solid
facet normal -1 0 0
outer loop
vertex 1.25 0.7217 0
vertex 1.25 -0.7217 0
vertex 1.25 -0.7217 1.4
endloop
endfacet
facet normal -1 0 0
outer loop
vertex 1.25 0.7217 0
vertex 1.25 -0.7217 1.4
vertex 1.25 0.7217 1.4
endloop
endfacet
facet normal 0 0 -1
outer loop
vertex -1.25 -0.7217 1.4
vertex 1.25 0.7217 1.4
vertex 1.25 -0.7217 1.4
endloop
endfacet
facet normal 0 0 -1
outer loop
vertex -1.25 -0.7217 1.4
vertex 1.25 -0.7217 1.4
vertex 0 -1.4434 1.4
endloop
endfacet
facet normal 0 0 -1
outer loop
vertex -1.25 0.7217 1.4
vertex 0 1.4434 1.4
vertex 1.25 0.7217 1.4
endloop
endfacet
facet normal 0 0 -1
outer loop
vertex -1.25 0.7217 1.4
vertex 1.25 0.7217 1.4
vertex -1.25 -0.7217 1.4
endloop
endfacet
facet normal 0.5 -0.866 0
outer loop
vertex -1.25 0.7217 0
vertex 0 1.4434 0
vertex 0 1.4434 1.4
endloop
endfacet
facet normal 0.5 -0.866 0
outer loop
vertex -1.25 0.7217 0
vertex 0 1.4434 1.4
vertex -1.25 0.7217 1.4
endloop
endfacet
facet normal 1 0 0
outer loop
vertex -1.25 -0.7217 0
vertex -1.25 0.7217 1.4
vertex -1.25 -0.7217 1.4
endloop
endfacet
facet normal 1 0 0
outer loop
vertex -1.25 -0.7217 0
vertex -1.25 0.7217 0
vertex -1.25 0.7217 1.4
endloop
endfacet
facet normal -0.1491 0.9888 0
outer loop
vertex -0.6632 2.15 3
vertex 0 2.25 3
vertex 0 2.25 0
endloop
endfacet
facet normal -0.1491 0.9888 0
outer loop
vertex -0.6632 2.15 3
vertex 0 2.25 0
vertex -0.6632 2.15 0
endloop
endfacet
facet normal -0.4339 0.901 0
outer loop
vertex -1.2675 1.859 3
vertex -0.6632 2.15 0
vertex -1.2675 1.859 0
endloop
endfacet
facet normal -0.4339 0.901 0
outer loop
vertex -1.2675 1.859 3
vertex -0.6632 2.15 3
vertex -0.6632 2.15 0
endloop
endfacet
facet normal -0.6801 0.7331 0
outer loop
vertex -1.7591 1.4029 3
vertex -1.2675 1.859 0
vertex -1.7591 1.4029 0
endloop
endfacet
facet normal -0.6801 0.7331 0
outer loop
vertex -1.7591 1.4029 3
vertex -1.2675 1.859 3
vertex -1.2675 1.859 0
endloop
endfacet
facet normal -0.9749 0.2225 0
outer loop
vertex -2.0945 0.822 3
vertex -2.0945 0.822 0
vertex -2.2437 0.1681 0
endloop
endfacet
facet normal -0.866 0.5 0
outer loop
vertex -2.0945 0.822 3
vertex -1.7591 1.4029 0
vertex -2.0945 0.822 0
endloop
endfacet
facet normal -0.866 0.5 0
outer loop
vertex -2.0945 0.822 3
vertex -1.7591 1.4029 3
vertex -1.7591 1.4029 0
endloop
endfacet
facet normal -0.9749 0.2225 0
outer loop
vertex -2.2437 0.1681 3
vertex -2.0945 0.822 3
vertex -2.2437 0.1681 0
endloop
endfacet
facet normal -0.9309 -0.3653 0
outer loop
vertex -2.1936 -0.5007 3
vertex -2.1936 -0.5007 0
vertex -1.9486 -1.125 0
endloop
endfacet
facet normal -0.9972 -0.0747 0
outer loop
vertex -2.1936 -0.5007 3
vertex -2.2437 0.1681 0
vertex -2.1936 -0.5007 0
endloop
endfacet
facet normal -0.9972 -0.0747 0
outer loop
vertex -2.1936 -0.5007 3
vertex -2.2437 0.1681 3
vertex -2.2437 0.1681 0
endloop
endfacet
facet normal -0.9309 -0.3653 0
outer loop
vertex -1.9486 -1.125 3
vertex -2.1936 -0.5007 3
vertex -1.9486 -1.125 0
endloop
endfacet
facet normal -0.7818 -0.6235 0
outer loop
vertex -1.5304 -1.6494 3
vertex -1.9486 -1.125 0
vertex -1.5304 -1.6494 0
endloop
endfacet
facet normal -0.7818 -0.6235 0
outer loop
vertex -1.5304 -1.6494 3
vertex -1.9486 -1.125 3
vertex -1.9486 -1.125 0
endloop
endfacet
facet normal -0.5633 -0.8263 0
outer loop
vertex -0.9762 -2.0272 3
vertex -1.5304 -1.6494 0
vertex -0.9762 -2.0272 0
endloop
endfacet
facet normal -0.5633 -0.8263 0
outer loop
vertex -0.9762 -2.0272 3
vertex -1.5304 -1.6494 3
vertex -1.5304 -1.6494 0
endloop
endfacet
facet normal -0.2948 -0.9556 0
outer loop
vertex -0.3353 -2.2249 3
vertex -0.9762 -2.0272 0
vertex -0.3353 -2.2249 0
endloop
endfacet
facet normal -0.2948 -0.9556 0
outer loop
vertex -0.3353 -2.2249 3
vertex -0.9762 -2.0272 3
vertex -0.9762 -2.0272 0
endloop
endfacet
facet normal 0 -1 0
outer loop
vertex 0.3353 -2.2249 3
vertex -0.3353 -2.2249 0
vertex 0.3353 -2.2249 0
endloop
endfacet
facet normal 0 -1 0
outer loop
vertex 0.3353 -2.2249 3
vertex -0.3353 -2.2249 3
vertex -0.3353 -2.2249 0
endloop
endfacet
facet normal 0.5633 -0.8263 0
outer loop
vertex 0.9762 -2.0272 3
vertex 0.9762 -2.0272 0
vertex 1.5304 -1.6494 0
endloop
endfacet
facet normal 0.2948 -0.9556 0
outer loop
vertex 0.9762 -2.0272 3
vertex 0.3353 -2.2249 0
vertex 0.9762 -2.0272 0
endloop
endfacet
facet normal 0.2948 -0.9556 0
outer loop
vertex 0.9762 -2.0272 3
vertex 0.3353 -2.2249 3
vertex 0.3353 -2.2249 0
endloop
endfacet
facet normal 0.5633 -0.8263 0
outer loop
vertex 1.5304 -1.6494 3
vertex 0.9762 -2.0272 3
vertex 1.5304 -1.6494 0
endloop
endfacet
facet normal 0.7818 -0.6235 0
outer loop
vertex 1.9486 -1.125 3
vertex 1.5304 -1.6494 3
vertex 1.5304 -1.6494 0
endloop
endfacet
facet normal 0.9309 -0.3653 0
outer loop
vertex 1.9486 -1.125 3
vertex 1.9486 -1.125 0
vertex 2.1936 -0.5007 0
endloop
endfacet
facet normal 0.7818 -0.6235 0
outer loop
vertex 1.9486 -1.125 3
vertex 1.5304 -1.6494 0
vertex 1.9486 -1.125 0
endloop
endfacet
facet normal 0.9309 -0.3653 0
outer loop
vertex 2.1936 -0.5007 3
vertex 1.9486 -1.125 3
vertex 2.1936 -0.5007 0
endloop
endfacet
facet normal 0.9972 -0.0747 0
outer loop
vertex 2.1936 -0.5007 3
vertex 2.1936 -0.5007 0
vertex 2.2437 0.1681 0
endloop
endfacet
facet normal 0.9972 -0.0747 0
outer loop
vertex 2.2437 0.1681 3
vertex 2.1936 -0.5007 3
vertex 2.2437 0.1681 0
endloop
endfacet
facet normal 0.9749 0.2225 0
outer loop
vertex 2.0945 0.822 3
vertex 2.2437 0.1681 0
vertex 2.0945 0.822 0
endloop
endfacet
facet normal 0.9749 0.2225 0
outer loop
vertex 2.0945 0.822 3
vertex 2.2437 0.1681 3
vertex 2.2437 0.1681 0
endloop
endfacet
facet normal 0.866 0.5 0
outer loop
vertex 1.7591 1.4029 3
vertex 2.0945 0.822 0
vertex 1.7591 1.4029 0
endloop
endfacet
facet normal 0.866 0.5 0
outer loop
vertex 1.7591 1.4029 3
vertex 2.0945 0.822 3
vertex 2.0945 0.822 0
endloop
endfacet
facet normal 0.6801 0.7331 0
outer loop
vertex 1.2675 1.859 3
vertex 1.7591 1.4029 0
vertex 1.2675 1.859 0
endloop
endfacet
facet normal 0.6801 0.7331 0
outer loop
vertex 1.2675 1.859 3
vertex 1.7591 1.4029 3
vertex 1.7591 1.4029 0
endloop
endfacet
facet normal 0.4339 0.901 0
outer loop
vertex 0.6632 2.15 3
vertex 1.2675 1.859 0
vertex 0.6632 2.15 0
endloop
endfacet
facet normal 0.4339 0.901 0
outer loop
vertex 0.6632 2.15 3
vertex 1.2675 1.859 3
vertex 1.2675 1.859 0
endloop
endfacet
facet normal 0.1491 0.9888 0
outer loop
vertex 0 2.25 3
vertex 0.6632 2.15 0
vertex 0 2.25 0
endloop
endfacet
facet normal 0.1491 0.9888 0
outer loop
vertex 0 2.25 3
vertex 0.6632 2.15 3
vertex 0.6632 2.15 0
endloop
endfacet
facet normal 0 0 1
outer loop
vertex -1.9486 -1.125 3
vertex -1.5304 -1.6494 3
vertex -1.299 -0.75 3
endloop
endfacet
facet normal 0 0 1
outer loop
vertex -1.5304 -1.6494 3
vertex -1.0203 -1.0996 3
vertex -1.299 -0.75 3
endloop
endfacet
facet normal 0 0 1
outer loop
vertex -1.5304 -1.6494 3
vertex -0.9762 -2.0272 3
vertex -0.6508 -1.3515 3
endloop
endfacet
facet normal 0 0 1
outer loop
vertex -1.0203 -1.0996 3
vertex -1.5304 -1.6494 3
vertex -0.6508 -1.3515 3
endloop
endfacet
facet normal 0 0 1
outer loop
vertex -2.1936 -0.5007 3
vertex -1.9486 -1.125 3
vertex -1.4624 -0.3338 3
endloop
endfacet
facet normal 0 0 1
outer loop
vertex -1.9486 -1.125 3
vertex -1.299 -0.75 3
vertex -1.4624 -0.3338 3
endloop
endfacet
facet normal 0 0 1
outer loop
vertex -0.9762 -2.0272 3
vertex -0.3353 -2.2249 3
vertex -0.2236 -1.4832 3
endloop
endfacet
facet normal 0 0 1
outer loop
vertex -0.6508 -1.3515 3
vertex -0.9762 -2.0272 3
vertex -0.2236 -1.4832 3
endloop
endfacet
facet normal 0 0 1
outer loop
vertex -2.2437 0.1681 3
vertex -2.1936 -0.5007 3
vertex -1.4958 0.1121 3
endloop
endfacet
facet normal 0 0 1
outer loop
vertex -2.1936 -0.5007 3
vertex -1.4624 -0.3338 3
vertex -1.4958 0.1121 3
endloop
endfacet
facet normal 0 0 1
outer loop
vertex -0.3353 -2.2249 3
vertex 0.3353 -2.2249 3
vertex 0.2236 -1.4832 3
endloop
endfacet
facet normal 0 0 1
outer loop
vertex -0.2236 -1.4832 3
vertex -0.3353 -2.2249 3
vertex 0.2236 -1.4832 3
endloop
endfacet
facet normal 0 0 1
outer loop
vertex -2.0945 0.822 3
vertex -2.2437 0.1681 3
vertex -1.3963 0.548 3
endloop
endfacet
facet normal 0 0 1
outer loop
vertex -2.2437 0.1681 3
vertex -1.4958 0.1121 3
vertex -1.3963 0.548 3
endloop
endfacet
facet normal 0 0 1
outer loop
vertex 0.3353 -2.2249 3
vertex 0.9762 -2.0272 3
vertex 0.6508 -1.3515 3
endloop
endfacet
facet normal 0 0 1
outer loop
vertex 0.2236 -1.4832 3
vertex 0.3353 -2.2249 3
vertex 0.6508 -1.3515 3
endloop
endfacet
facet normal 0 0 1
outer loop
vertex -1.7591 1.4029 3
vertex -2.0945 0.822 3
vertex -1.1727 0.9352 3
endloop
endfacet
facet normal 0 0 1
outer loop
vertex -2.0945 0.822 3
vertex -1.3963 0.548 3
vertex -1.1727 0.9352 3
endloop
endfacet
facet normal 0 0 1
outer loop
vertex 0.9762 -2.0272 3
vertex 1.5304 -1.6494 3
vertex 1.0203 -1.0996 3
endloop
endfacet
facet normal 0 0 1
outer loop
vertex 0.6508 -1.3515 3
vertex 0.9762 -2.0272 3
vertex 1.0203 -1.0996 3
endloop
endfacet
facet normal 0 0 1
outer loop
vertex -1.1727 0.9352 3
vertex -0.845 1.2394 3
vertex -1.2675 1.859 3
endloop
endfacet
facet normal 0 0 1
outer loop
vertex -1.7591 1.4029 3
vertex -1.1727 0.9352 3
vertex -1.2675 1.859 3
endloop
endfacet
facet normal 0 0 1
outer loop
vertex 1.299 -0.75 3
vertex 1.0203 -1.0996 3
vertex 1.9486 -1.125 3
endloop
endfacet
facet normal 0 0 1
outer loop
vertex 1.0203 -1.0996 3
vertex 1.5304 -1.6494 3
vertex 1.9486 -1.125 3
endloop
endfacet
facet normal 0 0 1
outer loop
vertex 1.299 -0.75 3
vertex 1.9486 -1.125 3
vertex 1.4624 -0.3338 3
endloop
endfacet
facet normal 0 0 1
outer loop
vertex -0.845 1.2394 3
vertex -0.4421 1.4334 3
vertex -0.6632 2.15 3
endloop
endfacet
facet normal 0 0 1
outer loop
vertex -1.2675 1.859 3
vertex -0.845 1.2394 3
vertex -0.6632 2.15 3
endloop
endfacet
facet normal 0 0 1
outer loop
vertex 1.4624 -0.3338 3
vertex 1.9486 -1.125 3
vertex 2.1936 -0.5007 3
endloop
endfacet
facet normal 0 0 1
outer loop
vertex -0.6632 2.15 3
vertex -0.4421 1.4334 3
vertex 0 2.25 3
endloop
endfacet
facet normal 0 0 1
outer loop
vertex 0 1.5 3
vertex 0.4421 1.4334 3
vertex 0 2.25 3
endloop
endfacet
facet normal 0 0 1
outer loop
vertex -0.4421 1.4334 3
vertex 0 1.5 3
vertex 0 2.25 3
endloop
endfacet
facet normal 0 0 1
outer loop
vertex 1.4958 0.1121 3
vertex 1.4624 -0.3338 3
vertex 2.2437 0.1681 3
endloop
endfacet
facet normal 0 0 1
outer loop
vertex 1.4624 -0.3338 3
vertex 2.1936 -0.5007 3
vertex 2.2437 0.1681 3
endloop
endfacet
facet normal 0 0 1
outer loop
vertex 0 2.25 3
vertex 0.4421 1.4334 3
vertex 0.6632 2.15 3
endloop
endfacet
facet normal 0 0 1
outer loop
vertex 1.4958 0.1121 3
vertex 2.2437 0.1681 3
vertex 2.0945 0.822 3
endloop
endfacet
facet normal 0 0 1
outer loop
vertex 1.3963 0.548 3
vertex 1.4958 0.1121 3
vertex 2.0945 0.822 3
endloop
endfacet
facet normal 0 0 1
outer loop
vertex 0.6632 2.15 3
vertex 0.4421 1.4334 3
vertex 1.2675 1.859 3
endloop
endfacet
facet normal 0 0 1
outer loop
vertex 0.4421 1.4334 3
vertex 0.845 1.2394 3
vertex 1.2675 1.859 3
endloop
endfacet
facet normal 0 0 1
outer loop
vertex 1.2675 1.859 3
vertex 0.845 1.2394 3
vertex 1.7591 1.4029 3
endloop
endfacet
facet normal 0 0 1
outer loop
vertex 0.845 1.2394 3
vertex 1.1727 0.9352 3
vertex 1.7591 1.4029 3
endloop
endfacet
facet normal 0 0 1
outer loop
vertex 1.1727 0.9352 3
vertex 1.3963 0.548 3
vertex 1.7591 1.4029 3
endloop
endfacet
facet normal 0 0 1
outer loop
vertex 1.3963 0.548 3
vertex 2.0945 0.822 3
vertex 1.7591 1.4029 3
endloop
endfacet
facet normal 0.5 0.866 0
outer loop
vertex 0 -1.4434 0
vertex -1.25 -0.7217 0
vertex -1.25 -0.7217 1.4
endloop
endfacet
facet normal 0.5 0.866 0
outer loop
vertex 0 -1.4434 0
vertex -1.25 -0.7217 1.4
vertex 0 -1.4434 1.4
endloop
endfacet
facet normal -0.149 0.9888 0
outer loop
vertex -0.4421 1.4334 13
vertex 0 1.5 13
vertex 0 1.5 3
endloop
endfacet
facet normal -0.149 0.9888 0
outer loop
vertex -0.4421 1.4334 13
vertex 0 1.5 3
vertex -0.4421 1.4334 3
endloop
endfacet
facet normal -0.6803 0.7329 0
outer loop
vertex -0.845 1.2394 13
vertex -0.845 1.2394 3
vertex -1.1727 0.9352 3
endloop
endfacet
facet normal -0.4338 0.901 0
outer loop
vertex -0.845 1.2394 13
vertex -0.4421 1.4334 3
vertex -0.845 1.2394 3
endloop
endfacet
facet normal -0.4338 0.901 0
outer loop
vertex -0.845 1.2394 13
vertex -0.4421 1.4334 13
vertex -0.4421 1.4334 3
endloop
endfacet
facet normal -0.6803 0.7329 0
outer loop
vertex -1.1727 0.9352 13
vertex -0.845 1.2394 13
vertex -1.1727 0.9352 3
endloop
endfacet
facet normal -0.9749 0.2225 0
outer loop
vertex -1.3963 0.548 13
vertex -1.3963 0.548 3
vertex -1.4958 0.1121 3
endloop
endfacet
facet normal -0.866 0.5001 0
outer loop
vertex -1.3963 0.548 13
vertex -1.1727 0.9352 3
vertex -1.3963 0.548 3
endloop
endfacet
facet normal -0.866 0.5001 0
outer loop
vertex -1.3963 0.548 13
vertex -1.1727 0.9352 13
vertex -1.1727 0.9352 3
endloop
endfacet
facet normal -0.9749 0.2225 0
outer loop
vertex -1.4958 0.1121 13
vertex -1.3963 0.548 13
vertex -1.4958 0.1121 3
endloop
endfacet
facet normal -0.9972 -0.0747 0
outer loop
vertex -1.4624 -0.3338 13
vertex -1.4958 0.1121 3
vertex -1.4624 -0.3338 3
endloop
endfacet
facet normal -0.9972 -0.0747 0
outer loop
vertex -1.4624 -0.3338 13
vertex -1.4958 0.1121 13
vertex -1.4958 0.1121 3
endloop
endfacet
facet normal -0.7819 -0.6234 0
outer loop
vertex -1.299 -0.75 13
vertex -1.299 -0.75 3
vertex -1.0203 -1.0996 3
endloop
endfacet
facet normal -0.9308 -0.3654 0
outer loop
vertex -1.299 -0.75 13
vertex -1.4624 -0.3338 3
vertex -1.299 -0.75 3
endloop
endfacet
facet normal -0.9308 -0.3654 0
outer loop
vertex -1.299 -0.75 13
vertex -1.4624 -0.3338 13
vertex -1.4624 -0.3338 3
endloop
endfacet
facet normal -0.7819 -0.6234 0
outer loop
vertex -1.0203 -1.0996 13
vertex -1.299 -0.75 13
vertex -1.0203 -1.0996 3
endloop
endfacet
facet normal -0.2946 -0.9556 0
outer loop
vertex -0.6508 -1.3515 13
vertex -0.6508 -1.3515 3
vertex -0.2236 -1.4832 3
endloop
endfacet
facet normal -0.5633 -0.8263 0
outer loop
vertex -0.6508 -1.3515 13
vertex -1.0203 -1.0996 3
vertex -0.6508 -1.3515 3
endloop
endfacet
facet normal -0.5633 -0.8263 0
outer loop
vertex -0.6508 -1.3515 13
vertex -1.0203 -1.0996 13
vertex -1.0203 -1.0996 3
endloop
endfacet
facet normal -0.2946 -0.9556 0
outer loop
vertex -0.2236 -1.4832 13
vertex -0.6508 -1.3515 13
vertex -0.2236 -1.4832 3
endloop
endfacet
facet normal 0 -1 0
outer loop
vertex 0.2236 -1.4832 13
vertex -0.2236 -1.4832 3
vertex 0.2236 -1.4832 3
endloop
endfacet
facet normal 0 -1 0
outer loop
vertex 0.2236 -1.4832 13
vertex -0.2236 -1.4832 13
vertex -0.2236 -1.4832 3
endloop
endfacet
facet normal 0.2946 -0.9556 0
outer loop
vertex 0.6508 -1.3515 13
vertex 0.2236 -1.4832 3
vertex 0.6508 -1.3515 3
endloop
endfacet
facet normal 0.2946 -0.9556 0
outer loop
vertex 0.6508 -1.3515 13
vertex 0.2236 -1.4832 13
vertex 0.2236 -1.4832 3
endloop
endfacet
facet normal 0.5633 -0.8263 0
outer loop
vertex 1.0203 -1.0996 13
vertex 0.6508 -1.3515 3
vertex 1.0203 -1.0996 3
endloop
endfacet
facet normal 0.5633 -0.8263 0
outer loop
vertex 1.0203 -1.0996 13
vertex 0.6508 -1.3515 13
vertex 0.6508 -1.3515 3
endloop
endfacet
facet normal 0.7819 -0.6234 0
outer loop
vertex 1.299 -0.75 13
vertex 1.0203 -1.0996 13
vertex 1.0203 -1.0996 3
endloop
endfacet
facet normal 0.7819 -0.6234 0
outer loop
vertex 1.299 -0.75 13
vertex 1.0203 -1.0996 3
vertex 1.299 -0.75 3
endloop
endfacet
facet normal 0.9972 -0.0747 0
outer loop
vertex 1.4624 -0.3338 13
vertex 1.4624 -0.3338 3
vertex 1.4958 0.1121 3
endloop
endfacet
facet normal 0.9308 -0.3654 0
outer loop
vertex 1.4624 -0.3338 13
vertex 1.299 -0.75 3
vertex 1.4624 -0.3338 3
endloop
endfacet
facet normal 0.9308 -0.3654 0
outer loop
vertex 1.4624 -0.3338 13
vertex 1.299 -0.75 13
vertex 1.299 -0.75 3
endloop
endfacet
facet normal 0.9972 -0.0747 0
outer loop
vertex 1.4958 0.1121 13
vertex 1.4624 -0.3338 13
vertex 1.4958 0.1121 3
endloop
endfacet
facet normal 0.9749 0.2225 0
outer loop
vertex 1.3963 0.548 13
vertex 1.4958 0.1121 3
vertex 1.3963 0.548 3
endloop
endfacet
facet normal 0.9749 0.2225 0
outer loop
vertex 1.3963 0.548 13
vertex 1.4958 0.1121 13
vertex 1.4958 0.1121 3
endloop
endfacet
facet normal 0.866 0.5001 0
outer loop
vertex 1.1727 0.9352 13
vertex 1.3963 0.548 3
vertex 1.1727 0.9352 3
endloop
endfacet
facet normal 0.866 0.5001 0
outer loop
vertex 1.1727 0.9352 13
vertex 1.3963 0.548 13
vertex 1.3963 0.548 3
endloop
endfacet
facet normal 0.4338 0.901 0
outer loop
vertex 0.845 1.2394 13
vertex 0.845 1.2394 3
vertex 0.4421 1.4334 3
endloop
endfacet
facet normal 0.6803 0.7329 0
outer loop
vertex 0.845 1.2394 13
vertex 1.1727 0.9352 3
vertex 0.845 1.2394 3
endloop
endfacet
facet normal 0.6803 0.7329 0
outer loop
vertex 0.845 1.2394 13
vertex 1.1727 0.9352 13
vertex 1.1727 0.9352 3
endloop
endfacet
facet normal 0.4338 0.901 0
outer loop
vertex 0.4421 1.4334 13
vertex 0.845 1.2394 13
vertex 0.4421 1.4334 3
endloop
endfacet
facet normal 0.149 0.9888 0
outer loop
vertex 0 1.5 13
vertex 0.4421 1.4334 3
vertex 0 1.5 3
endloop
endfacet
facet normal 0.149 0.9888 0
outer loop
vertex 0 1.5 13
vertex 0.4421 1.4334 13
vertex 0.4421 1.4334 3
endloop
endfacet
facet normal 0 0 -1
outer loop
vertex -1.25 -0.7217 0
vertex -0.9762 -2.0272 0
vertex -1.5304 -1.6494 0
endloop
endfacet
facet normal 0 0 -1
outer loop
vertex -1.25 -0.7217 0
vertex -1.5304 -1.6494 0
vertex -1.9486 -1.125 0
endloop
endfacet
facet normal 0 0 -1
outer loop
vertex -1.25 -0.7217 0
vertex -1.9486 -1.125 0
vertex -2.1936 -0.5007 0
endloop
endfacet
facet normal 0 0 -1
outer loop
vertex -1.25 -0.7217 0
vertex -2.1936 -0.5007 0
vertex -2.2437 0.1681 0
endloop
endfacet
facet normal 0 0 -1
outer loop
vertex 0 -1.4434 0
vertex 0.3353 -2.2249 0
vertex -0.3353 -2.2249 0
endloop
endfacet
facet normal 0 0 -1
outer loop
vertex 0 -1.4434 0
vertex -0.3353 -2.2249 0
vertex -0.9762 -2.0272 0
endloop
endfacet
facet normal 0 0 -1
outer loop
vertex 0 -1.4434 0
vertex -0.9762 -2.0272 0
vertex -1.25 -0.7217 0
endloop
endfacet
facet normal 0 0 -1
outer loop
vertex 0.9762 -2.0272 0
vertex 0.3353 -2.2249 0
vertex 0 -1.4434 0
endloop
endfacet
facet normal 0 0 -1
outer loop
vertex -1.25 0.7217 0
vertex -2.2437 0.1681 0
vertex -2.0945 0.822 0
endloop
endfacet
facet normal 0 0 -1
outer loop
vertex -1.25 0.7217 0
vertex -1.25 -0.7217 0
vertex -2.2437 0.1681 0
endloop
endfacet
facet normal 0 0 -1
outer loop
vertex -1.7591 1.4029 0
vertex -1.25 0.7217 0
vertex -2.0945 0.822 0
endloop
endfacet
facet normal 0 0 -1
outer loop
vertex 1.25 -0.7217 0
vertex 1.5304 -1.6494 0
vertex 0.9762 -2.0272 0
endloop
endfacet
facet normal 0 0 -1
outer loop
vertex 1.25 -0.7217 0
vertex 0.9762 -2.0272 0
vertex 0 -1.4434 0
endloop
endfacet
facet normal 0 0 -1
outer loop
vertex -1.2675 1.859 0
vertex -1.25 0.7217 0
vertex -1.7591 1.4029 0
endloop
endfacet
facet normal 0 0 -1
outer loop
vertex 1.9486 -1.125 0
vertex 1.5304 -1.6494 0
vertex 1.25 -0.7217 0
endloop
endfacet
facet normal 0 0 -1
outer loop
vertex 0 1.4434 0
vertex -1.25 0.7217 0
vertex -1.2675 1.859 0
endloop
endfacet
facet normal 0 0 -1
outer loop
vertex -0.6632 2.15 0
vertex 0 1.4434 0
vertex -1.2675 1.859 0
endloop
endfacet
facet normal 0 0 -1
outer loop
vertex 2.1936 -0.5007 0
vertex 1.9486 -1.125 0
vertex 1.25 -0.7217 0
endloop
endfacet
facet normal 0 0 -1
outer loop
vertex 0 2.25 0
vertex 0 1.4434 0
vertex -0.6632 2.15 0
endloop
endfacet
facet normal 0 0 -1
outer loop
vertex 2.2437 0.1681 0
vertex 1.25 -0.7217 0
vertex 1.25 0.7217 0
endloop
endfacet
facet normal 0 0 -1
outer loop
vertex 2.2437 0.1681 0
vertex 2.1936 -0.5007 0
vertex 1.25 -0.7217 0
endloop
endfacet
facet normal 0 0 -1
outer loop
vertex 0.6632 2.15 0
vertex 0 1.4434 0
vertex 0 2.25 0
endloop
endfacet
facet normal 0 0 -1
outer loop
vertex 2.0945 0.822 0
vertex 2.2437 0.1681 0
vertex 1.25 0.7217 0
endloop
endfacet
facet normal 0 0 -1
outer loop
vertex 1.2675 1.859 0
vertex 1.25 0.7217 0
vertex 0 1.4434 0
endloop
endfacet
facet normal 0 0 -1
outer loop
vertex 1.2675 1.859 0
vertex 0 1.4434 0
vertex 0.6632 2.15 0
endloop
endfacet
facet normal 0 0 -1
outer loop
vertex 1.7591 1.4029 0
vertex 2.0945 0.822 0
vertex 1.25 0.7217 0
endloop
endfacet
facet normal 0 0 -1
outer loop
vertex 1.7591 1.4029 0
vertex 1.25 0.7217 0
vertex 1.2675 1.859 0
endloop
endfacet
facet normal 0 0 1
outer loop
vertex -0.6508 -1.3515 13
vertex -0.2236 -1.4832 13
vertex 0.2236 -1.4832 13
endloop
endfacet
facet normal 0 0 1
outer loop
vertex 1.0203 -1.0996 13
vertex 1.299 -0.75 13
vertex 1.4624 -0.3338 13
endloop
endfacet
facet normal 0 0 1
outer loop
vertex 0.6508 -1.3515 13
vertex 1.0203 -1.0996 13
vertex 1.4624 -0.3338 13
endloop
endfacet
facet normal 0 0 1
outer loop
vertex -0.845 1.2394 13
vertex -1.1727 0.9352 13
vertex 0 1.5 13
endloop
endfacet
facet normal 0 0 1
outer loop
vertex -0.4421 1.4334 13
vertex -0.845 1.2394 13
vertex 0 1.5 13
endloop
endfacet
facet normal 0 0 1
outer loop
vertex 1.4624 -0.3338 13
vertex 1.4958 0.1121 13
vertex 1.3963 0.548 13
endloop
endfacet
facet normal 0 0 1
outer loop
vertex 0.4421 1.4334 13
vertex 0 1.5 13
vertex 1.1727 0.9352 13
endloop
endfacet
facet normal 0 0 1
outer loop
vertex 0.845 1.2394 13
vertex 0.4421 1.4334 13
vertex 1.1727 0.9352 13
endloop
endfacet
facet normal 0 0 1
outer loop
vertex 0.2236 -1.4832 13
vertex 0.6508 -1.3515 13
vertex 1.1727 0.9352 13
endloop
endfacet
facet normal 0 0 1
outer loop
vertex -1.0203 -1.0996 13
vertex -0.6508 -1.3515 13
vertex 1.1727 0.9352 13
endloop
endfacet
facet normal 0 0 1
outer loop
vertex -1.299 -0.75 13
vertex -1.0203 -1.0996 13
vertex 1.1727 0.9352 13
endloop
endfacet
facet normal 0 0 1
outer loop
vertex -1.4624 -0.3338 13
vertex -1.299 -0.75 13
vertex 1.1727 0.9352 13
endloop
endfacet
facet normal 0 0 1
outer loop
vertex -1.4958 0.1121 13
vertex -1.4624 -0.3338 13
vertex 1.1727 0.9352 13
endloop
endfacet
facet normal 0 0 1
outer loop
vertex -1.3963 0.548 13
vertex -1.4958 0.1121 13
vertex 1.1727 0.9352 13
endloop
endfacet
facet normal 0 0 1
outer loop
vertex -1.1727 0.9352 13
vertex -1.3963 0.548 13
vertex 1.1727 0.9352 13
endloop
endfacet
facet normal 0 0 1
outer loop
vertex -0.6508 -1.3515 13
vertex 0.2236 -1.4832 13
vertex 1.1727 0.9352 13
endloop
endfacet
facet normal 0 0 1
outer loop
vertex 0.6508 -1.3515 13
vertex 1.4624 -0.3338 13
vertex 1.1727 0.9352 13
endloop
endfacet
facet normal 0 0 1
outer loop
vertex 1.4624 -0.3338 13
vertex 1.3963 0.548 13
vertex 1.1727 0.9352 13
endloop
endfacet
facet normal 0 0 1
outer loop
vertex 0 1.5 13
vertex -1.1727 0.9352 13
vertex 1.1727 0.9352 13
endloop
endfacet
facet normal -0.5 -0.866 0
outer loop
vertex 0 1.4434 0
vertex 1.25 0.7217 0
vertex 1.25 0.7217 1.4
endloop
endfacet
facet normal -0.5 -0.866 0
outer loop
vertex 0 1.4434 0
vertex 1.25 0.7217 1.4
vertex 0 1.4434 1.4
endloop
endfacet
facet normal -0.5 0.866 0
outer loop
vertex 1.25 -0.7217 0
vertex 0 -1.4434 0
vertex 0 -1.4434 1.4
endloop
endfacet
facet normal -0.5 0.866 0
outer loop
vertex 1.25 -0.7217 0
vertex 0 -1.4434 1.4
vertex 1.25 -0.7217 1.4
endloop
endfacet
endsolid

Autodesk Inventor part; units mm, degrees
ref_plane "YZ Plane" through (0, 0, 0) normal (1, 0, 0) x (0, 1, 0)
ref_plane "XZ Plane" through (0, 0, 0) normal (0, 1, 0) x (-1, 0, 0)
ref_plane "XY Plane" through (0, 0, 0) normal (0, 0, 1) x (1, 0, 0)
sketch "スケッチ1" plane through (0, 0, 0) normal (1, 0, 0) x (0, 1, 0)
  line L0 (0, 13) -> (0, 0)
  line L1 (0, 0) -> (2.25, 0)
  line L2 (2.25, 0) -> (2.25, 3)
  line L3 (2.25, 3) -> (1.5, 3)
  line L4 (1.5, 3) -> (1.5, 13)
  line L5 (1.5, 13) -> (0, 13)
  dimension "d2" = 3
  dimension "d10" = 10
  dimension "d11" = 3
  dimension "d12" = 4.5
revolve "回転1" add sketch "スケッチ1" angle 360 about axis through (0, 0, 13) along (0, 0, -1)
thread "ねじ1" size "M3x0.5" class "6g" standard "ANSI Metric M Profile" full length
sketch "スケッチ2" plane through (0, 0, 0) normal (0, 0, -1) x (-1, 0, 0)
  line L0 (0, 1.4434) -> (1.25, 0.7217)
  line L1 (1.25, 0.7217) -> (1.25, -0.7217)
  line L2 (1.25, -0.7217) -> (0, -1.4434)
  line L3 (0, -1.4434) -> (-1.25, -0.7217)
  line L4 (-1.25, -0.7217) -> (-1.25, 0.7217)
  line L5 (-1.25, 0.7217) -> (0, 1.4434)
  circle A0 centre (0, 0) radius 2.25 projected
  line L6 (0, 2.25) -> (0, -2.25) construction
  point P0 (0, 0)
  dimension "d7" = 2.5
extrude "押し出し1" cut sketch "スケッチ2" against normal blind 1.4 contours L0 L1 L2 L3 L4 L5
properties part number "CSHSM-SUS-M3-10" material "ステンレス鋼 AISI 304"
